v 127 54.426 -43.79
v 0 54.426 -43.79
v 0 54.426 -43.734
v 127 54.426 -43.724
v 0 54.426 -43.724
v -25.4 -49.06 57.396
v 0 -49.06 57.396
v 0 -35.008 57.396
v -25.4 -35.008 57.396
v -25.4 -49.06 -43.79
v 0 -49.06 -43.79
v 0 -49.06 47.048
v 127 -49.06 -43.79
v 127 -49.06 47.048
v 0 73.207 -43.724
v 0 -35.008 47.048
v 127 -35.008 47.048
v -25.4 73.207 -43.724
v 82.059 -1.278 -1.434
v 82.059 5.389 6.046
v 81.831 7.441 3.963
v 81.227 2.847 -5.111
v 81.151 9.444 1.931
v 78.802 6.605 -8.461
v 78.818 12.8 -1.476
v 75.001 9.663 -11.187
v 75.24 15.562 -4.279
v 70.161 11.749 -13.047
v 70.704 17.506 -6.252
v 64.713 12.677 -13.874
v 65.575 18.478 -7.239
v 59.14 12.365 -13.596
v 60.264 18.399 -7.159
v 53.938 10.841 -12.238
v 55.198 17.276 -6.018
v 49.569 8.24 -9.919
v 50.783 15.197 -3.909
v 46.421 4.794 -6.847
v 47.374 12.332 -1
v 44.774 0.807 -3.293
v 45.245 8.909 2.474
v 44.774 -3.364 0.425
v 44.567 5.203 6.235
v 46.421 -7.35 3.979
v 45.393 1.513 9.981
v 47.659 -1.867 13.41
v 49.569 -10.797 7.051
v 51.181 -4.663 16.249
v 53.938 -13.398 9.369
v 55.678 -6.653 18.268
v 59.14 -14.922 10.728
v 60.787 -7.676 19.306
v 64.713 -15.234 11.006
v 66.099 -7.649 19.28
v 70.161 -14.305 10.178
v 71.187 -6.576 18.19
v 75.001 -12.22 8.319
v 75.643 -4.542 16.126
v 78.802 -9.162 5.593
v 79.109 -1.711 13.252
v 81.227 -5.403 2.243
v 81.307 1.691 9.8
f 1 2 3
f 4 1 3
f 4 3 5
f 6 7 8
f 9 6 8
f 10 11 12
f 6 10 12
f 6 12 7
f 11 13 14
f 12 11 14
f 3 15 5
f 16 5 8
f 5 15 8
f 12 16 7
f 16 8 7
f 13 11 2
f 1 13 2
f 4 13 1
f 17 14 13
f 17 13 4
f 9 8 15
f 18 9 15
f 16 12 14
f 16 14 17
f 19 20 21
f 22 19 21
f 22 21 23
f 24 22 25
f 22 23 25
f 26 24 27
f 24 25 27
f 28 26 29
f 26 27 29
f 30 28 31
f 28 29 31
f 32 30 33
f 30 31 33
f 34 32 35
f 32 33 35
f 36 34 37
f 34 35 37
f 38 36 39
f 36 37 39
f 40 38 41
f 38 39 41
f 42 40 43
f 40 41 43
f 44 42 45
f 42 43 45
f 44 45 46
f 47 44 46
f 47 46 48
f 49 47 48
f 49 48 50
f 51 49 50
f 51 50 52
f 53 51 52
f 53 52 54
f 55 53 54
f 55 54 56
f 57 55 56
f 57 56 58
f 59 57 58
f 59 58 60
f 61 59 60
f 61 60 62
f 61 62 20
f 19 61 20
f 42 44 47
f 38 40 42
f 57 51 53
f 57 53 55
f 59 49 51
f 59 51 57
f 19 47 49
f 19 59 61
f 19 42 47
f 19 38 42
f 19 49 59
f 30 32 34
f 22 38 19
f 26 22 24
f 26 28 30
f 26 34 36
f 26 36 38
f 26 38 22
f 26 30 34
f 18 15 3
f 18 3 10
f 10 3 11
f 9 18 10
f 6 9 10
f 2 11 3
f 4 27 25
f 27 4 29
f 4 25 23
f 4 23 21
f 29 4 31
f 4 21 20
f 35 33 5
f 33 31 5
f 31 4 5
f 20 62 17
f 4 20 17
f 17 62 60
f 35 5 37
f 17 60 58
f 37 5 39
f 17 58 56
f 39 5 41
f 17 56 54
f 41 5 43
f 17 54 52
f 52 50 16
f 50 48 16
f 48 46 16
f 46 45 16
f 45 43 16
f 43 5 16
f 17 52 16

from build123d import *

# Parameters (mm, degrees)
F0_W     = 103.4859903157
F0_H     = 90.8377021551
F1_DEPTH = 127
F3_DEPTH = 127.001
F4_R     = 18.7473468239
F5_DEPTH = 25.4
F7_DEPTH = 127.001
F9_DEPTH = 25.4


with BuildPart() as f1:
    # F0 (on Right) → F1 (new body)
    with BuildSketch(Plane.YZ):
        with Locations((2.6829708368, 1.6289465129)):
            Rectangle(F0_W, F0_H)
    extrude(amount=F1_DEPTH)

    # F2 (on face) → F3 (cut, through all)
    with BuildSketch(Plane.YZ.offset(127)):
        Polygon((62.4748729169, 57.3963969946), (-45.2272109687, 71.7694461346), (64.1996413469, -25.7756765932), align=None)
    extrude(amount=-F3_DEPTH, mode=Mode.SUBTRACT)

    # F4 (on face) → F5 (cut)
    with BuildSketch(Plane(origin=(0, 15.6232196657, 17.5262453236), x_dir=(1, 0, 0), z_dir=(0, 0.6654180184, 0.7464709377))):
        with Locations((63.312150538, 0)):
            Circle(F4_R)
    extrude(amount=-F5_DEPTH, mode=Mode.SUBTRACT)

    # F6 (on face) → F7 (cut, through all)
    with BuildSketch(Plane(origin=(0, 0, 0), x_dir=(0, -1, 0), z_dir=(-1, 0, 0))):
        Polygon((-58.8337033987, -48.1976419687), (43.6940863729, 55.8632686734), (45.8021350205, 72.5360140204), (-54.4259659946, 13.5106705129), align=None)
    extrude(amount=-F7_DEPTH, mode=Mode.SUBTRACT)

    # F8 (on face) → F9 (join)
    with BuildSketch(Plane(origin=(0, 0, 0), x_dir=(0, -1, 0), z_dir=(-1, 0, 0))):
        Polygon((49.0600243211, -43.7899045646), (49.0600243211, 47.0477975905), (49.0600243211, 57.3963969946), (35.0084929031, 57.3963969946), (-73.2067525387, -43.7239946857), align=None)
    extrude(amount=F9_DEPTH)


solid = f1.part
